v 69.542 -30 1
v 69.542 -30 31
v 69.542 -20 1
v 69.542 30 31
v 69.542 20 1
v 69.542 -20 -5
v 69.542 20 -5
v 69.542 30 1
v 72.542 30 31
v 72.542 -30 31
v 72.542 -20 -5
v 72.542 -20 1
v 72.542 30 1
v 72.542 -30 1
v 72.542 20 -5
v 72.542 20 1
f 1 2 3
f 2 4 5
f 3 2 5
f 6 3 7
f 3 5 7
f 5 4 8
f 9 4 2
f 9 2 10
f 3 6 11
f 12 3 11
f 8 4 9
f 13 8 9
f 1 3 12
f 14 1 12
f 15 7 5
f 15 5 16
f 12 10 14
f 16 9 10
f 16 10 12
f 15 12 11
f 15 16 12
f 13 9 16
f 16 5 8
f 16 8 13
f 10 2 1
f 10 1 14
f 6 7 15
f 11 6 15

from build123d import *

# Parameters (mm, degrees)
ESTRUSIONE_ESTRUSIONE1_DEPTH      = 30
ESTRUSIONE_ESTRUSIONE1_DEPTH_BACK = 6
SCHIZZO1_W                        = 3
SCHIZZO1_H                        = 40
SCHIZZO2_W                        = 3
SCHIZZO2_H                        = 30
ESTRUSIONE_ESTRUSIONE2_DEPTH      = 10


with BuildPart() as part:
    # Schizzo1 → Estrusione-Estrusione1 (new, two sides: drawn at the far end of the back side and taken through both)
    with BuildSketch(Plane.XY.offset(1).offset(-ESTRUSIONE_ESTRUSIONE1_DEPTH_BACK)):
        with Locations((71.042298103, 0)):
            Rectangle(SCHIZZO1_W, SCHIZZO1_H)
    extrude(amount=ESTRUSIONE_ESTRUSIONE1_DEPTH + ESTRUSIONE_ESTRUSIONE1_DEPTH_BACK)

    # Schizzo2 → Estrusione-Estrusione2 (add)
    with BuildSketch(Plane(origin=(0, 20, 0), x_dir=(1, 0, 0), z_dir=(0, 1, 0))):
        with Locations((71.042298103, -16)):
            Rectangle(SCHIZZO2_W, SCHIZZO2_H)
    estrusione_estrusione2 = extrude(amount=ESTRUSIONE_ESTRUSIONE2_DEPTH)

    # Specchia1: Estrusione-Estrusione2 across plane
    add(estrusione_estrusione2.mirror(Plane.ZX))


solid = part.part
